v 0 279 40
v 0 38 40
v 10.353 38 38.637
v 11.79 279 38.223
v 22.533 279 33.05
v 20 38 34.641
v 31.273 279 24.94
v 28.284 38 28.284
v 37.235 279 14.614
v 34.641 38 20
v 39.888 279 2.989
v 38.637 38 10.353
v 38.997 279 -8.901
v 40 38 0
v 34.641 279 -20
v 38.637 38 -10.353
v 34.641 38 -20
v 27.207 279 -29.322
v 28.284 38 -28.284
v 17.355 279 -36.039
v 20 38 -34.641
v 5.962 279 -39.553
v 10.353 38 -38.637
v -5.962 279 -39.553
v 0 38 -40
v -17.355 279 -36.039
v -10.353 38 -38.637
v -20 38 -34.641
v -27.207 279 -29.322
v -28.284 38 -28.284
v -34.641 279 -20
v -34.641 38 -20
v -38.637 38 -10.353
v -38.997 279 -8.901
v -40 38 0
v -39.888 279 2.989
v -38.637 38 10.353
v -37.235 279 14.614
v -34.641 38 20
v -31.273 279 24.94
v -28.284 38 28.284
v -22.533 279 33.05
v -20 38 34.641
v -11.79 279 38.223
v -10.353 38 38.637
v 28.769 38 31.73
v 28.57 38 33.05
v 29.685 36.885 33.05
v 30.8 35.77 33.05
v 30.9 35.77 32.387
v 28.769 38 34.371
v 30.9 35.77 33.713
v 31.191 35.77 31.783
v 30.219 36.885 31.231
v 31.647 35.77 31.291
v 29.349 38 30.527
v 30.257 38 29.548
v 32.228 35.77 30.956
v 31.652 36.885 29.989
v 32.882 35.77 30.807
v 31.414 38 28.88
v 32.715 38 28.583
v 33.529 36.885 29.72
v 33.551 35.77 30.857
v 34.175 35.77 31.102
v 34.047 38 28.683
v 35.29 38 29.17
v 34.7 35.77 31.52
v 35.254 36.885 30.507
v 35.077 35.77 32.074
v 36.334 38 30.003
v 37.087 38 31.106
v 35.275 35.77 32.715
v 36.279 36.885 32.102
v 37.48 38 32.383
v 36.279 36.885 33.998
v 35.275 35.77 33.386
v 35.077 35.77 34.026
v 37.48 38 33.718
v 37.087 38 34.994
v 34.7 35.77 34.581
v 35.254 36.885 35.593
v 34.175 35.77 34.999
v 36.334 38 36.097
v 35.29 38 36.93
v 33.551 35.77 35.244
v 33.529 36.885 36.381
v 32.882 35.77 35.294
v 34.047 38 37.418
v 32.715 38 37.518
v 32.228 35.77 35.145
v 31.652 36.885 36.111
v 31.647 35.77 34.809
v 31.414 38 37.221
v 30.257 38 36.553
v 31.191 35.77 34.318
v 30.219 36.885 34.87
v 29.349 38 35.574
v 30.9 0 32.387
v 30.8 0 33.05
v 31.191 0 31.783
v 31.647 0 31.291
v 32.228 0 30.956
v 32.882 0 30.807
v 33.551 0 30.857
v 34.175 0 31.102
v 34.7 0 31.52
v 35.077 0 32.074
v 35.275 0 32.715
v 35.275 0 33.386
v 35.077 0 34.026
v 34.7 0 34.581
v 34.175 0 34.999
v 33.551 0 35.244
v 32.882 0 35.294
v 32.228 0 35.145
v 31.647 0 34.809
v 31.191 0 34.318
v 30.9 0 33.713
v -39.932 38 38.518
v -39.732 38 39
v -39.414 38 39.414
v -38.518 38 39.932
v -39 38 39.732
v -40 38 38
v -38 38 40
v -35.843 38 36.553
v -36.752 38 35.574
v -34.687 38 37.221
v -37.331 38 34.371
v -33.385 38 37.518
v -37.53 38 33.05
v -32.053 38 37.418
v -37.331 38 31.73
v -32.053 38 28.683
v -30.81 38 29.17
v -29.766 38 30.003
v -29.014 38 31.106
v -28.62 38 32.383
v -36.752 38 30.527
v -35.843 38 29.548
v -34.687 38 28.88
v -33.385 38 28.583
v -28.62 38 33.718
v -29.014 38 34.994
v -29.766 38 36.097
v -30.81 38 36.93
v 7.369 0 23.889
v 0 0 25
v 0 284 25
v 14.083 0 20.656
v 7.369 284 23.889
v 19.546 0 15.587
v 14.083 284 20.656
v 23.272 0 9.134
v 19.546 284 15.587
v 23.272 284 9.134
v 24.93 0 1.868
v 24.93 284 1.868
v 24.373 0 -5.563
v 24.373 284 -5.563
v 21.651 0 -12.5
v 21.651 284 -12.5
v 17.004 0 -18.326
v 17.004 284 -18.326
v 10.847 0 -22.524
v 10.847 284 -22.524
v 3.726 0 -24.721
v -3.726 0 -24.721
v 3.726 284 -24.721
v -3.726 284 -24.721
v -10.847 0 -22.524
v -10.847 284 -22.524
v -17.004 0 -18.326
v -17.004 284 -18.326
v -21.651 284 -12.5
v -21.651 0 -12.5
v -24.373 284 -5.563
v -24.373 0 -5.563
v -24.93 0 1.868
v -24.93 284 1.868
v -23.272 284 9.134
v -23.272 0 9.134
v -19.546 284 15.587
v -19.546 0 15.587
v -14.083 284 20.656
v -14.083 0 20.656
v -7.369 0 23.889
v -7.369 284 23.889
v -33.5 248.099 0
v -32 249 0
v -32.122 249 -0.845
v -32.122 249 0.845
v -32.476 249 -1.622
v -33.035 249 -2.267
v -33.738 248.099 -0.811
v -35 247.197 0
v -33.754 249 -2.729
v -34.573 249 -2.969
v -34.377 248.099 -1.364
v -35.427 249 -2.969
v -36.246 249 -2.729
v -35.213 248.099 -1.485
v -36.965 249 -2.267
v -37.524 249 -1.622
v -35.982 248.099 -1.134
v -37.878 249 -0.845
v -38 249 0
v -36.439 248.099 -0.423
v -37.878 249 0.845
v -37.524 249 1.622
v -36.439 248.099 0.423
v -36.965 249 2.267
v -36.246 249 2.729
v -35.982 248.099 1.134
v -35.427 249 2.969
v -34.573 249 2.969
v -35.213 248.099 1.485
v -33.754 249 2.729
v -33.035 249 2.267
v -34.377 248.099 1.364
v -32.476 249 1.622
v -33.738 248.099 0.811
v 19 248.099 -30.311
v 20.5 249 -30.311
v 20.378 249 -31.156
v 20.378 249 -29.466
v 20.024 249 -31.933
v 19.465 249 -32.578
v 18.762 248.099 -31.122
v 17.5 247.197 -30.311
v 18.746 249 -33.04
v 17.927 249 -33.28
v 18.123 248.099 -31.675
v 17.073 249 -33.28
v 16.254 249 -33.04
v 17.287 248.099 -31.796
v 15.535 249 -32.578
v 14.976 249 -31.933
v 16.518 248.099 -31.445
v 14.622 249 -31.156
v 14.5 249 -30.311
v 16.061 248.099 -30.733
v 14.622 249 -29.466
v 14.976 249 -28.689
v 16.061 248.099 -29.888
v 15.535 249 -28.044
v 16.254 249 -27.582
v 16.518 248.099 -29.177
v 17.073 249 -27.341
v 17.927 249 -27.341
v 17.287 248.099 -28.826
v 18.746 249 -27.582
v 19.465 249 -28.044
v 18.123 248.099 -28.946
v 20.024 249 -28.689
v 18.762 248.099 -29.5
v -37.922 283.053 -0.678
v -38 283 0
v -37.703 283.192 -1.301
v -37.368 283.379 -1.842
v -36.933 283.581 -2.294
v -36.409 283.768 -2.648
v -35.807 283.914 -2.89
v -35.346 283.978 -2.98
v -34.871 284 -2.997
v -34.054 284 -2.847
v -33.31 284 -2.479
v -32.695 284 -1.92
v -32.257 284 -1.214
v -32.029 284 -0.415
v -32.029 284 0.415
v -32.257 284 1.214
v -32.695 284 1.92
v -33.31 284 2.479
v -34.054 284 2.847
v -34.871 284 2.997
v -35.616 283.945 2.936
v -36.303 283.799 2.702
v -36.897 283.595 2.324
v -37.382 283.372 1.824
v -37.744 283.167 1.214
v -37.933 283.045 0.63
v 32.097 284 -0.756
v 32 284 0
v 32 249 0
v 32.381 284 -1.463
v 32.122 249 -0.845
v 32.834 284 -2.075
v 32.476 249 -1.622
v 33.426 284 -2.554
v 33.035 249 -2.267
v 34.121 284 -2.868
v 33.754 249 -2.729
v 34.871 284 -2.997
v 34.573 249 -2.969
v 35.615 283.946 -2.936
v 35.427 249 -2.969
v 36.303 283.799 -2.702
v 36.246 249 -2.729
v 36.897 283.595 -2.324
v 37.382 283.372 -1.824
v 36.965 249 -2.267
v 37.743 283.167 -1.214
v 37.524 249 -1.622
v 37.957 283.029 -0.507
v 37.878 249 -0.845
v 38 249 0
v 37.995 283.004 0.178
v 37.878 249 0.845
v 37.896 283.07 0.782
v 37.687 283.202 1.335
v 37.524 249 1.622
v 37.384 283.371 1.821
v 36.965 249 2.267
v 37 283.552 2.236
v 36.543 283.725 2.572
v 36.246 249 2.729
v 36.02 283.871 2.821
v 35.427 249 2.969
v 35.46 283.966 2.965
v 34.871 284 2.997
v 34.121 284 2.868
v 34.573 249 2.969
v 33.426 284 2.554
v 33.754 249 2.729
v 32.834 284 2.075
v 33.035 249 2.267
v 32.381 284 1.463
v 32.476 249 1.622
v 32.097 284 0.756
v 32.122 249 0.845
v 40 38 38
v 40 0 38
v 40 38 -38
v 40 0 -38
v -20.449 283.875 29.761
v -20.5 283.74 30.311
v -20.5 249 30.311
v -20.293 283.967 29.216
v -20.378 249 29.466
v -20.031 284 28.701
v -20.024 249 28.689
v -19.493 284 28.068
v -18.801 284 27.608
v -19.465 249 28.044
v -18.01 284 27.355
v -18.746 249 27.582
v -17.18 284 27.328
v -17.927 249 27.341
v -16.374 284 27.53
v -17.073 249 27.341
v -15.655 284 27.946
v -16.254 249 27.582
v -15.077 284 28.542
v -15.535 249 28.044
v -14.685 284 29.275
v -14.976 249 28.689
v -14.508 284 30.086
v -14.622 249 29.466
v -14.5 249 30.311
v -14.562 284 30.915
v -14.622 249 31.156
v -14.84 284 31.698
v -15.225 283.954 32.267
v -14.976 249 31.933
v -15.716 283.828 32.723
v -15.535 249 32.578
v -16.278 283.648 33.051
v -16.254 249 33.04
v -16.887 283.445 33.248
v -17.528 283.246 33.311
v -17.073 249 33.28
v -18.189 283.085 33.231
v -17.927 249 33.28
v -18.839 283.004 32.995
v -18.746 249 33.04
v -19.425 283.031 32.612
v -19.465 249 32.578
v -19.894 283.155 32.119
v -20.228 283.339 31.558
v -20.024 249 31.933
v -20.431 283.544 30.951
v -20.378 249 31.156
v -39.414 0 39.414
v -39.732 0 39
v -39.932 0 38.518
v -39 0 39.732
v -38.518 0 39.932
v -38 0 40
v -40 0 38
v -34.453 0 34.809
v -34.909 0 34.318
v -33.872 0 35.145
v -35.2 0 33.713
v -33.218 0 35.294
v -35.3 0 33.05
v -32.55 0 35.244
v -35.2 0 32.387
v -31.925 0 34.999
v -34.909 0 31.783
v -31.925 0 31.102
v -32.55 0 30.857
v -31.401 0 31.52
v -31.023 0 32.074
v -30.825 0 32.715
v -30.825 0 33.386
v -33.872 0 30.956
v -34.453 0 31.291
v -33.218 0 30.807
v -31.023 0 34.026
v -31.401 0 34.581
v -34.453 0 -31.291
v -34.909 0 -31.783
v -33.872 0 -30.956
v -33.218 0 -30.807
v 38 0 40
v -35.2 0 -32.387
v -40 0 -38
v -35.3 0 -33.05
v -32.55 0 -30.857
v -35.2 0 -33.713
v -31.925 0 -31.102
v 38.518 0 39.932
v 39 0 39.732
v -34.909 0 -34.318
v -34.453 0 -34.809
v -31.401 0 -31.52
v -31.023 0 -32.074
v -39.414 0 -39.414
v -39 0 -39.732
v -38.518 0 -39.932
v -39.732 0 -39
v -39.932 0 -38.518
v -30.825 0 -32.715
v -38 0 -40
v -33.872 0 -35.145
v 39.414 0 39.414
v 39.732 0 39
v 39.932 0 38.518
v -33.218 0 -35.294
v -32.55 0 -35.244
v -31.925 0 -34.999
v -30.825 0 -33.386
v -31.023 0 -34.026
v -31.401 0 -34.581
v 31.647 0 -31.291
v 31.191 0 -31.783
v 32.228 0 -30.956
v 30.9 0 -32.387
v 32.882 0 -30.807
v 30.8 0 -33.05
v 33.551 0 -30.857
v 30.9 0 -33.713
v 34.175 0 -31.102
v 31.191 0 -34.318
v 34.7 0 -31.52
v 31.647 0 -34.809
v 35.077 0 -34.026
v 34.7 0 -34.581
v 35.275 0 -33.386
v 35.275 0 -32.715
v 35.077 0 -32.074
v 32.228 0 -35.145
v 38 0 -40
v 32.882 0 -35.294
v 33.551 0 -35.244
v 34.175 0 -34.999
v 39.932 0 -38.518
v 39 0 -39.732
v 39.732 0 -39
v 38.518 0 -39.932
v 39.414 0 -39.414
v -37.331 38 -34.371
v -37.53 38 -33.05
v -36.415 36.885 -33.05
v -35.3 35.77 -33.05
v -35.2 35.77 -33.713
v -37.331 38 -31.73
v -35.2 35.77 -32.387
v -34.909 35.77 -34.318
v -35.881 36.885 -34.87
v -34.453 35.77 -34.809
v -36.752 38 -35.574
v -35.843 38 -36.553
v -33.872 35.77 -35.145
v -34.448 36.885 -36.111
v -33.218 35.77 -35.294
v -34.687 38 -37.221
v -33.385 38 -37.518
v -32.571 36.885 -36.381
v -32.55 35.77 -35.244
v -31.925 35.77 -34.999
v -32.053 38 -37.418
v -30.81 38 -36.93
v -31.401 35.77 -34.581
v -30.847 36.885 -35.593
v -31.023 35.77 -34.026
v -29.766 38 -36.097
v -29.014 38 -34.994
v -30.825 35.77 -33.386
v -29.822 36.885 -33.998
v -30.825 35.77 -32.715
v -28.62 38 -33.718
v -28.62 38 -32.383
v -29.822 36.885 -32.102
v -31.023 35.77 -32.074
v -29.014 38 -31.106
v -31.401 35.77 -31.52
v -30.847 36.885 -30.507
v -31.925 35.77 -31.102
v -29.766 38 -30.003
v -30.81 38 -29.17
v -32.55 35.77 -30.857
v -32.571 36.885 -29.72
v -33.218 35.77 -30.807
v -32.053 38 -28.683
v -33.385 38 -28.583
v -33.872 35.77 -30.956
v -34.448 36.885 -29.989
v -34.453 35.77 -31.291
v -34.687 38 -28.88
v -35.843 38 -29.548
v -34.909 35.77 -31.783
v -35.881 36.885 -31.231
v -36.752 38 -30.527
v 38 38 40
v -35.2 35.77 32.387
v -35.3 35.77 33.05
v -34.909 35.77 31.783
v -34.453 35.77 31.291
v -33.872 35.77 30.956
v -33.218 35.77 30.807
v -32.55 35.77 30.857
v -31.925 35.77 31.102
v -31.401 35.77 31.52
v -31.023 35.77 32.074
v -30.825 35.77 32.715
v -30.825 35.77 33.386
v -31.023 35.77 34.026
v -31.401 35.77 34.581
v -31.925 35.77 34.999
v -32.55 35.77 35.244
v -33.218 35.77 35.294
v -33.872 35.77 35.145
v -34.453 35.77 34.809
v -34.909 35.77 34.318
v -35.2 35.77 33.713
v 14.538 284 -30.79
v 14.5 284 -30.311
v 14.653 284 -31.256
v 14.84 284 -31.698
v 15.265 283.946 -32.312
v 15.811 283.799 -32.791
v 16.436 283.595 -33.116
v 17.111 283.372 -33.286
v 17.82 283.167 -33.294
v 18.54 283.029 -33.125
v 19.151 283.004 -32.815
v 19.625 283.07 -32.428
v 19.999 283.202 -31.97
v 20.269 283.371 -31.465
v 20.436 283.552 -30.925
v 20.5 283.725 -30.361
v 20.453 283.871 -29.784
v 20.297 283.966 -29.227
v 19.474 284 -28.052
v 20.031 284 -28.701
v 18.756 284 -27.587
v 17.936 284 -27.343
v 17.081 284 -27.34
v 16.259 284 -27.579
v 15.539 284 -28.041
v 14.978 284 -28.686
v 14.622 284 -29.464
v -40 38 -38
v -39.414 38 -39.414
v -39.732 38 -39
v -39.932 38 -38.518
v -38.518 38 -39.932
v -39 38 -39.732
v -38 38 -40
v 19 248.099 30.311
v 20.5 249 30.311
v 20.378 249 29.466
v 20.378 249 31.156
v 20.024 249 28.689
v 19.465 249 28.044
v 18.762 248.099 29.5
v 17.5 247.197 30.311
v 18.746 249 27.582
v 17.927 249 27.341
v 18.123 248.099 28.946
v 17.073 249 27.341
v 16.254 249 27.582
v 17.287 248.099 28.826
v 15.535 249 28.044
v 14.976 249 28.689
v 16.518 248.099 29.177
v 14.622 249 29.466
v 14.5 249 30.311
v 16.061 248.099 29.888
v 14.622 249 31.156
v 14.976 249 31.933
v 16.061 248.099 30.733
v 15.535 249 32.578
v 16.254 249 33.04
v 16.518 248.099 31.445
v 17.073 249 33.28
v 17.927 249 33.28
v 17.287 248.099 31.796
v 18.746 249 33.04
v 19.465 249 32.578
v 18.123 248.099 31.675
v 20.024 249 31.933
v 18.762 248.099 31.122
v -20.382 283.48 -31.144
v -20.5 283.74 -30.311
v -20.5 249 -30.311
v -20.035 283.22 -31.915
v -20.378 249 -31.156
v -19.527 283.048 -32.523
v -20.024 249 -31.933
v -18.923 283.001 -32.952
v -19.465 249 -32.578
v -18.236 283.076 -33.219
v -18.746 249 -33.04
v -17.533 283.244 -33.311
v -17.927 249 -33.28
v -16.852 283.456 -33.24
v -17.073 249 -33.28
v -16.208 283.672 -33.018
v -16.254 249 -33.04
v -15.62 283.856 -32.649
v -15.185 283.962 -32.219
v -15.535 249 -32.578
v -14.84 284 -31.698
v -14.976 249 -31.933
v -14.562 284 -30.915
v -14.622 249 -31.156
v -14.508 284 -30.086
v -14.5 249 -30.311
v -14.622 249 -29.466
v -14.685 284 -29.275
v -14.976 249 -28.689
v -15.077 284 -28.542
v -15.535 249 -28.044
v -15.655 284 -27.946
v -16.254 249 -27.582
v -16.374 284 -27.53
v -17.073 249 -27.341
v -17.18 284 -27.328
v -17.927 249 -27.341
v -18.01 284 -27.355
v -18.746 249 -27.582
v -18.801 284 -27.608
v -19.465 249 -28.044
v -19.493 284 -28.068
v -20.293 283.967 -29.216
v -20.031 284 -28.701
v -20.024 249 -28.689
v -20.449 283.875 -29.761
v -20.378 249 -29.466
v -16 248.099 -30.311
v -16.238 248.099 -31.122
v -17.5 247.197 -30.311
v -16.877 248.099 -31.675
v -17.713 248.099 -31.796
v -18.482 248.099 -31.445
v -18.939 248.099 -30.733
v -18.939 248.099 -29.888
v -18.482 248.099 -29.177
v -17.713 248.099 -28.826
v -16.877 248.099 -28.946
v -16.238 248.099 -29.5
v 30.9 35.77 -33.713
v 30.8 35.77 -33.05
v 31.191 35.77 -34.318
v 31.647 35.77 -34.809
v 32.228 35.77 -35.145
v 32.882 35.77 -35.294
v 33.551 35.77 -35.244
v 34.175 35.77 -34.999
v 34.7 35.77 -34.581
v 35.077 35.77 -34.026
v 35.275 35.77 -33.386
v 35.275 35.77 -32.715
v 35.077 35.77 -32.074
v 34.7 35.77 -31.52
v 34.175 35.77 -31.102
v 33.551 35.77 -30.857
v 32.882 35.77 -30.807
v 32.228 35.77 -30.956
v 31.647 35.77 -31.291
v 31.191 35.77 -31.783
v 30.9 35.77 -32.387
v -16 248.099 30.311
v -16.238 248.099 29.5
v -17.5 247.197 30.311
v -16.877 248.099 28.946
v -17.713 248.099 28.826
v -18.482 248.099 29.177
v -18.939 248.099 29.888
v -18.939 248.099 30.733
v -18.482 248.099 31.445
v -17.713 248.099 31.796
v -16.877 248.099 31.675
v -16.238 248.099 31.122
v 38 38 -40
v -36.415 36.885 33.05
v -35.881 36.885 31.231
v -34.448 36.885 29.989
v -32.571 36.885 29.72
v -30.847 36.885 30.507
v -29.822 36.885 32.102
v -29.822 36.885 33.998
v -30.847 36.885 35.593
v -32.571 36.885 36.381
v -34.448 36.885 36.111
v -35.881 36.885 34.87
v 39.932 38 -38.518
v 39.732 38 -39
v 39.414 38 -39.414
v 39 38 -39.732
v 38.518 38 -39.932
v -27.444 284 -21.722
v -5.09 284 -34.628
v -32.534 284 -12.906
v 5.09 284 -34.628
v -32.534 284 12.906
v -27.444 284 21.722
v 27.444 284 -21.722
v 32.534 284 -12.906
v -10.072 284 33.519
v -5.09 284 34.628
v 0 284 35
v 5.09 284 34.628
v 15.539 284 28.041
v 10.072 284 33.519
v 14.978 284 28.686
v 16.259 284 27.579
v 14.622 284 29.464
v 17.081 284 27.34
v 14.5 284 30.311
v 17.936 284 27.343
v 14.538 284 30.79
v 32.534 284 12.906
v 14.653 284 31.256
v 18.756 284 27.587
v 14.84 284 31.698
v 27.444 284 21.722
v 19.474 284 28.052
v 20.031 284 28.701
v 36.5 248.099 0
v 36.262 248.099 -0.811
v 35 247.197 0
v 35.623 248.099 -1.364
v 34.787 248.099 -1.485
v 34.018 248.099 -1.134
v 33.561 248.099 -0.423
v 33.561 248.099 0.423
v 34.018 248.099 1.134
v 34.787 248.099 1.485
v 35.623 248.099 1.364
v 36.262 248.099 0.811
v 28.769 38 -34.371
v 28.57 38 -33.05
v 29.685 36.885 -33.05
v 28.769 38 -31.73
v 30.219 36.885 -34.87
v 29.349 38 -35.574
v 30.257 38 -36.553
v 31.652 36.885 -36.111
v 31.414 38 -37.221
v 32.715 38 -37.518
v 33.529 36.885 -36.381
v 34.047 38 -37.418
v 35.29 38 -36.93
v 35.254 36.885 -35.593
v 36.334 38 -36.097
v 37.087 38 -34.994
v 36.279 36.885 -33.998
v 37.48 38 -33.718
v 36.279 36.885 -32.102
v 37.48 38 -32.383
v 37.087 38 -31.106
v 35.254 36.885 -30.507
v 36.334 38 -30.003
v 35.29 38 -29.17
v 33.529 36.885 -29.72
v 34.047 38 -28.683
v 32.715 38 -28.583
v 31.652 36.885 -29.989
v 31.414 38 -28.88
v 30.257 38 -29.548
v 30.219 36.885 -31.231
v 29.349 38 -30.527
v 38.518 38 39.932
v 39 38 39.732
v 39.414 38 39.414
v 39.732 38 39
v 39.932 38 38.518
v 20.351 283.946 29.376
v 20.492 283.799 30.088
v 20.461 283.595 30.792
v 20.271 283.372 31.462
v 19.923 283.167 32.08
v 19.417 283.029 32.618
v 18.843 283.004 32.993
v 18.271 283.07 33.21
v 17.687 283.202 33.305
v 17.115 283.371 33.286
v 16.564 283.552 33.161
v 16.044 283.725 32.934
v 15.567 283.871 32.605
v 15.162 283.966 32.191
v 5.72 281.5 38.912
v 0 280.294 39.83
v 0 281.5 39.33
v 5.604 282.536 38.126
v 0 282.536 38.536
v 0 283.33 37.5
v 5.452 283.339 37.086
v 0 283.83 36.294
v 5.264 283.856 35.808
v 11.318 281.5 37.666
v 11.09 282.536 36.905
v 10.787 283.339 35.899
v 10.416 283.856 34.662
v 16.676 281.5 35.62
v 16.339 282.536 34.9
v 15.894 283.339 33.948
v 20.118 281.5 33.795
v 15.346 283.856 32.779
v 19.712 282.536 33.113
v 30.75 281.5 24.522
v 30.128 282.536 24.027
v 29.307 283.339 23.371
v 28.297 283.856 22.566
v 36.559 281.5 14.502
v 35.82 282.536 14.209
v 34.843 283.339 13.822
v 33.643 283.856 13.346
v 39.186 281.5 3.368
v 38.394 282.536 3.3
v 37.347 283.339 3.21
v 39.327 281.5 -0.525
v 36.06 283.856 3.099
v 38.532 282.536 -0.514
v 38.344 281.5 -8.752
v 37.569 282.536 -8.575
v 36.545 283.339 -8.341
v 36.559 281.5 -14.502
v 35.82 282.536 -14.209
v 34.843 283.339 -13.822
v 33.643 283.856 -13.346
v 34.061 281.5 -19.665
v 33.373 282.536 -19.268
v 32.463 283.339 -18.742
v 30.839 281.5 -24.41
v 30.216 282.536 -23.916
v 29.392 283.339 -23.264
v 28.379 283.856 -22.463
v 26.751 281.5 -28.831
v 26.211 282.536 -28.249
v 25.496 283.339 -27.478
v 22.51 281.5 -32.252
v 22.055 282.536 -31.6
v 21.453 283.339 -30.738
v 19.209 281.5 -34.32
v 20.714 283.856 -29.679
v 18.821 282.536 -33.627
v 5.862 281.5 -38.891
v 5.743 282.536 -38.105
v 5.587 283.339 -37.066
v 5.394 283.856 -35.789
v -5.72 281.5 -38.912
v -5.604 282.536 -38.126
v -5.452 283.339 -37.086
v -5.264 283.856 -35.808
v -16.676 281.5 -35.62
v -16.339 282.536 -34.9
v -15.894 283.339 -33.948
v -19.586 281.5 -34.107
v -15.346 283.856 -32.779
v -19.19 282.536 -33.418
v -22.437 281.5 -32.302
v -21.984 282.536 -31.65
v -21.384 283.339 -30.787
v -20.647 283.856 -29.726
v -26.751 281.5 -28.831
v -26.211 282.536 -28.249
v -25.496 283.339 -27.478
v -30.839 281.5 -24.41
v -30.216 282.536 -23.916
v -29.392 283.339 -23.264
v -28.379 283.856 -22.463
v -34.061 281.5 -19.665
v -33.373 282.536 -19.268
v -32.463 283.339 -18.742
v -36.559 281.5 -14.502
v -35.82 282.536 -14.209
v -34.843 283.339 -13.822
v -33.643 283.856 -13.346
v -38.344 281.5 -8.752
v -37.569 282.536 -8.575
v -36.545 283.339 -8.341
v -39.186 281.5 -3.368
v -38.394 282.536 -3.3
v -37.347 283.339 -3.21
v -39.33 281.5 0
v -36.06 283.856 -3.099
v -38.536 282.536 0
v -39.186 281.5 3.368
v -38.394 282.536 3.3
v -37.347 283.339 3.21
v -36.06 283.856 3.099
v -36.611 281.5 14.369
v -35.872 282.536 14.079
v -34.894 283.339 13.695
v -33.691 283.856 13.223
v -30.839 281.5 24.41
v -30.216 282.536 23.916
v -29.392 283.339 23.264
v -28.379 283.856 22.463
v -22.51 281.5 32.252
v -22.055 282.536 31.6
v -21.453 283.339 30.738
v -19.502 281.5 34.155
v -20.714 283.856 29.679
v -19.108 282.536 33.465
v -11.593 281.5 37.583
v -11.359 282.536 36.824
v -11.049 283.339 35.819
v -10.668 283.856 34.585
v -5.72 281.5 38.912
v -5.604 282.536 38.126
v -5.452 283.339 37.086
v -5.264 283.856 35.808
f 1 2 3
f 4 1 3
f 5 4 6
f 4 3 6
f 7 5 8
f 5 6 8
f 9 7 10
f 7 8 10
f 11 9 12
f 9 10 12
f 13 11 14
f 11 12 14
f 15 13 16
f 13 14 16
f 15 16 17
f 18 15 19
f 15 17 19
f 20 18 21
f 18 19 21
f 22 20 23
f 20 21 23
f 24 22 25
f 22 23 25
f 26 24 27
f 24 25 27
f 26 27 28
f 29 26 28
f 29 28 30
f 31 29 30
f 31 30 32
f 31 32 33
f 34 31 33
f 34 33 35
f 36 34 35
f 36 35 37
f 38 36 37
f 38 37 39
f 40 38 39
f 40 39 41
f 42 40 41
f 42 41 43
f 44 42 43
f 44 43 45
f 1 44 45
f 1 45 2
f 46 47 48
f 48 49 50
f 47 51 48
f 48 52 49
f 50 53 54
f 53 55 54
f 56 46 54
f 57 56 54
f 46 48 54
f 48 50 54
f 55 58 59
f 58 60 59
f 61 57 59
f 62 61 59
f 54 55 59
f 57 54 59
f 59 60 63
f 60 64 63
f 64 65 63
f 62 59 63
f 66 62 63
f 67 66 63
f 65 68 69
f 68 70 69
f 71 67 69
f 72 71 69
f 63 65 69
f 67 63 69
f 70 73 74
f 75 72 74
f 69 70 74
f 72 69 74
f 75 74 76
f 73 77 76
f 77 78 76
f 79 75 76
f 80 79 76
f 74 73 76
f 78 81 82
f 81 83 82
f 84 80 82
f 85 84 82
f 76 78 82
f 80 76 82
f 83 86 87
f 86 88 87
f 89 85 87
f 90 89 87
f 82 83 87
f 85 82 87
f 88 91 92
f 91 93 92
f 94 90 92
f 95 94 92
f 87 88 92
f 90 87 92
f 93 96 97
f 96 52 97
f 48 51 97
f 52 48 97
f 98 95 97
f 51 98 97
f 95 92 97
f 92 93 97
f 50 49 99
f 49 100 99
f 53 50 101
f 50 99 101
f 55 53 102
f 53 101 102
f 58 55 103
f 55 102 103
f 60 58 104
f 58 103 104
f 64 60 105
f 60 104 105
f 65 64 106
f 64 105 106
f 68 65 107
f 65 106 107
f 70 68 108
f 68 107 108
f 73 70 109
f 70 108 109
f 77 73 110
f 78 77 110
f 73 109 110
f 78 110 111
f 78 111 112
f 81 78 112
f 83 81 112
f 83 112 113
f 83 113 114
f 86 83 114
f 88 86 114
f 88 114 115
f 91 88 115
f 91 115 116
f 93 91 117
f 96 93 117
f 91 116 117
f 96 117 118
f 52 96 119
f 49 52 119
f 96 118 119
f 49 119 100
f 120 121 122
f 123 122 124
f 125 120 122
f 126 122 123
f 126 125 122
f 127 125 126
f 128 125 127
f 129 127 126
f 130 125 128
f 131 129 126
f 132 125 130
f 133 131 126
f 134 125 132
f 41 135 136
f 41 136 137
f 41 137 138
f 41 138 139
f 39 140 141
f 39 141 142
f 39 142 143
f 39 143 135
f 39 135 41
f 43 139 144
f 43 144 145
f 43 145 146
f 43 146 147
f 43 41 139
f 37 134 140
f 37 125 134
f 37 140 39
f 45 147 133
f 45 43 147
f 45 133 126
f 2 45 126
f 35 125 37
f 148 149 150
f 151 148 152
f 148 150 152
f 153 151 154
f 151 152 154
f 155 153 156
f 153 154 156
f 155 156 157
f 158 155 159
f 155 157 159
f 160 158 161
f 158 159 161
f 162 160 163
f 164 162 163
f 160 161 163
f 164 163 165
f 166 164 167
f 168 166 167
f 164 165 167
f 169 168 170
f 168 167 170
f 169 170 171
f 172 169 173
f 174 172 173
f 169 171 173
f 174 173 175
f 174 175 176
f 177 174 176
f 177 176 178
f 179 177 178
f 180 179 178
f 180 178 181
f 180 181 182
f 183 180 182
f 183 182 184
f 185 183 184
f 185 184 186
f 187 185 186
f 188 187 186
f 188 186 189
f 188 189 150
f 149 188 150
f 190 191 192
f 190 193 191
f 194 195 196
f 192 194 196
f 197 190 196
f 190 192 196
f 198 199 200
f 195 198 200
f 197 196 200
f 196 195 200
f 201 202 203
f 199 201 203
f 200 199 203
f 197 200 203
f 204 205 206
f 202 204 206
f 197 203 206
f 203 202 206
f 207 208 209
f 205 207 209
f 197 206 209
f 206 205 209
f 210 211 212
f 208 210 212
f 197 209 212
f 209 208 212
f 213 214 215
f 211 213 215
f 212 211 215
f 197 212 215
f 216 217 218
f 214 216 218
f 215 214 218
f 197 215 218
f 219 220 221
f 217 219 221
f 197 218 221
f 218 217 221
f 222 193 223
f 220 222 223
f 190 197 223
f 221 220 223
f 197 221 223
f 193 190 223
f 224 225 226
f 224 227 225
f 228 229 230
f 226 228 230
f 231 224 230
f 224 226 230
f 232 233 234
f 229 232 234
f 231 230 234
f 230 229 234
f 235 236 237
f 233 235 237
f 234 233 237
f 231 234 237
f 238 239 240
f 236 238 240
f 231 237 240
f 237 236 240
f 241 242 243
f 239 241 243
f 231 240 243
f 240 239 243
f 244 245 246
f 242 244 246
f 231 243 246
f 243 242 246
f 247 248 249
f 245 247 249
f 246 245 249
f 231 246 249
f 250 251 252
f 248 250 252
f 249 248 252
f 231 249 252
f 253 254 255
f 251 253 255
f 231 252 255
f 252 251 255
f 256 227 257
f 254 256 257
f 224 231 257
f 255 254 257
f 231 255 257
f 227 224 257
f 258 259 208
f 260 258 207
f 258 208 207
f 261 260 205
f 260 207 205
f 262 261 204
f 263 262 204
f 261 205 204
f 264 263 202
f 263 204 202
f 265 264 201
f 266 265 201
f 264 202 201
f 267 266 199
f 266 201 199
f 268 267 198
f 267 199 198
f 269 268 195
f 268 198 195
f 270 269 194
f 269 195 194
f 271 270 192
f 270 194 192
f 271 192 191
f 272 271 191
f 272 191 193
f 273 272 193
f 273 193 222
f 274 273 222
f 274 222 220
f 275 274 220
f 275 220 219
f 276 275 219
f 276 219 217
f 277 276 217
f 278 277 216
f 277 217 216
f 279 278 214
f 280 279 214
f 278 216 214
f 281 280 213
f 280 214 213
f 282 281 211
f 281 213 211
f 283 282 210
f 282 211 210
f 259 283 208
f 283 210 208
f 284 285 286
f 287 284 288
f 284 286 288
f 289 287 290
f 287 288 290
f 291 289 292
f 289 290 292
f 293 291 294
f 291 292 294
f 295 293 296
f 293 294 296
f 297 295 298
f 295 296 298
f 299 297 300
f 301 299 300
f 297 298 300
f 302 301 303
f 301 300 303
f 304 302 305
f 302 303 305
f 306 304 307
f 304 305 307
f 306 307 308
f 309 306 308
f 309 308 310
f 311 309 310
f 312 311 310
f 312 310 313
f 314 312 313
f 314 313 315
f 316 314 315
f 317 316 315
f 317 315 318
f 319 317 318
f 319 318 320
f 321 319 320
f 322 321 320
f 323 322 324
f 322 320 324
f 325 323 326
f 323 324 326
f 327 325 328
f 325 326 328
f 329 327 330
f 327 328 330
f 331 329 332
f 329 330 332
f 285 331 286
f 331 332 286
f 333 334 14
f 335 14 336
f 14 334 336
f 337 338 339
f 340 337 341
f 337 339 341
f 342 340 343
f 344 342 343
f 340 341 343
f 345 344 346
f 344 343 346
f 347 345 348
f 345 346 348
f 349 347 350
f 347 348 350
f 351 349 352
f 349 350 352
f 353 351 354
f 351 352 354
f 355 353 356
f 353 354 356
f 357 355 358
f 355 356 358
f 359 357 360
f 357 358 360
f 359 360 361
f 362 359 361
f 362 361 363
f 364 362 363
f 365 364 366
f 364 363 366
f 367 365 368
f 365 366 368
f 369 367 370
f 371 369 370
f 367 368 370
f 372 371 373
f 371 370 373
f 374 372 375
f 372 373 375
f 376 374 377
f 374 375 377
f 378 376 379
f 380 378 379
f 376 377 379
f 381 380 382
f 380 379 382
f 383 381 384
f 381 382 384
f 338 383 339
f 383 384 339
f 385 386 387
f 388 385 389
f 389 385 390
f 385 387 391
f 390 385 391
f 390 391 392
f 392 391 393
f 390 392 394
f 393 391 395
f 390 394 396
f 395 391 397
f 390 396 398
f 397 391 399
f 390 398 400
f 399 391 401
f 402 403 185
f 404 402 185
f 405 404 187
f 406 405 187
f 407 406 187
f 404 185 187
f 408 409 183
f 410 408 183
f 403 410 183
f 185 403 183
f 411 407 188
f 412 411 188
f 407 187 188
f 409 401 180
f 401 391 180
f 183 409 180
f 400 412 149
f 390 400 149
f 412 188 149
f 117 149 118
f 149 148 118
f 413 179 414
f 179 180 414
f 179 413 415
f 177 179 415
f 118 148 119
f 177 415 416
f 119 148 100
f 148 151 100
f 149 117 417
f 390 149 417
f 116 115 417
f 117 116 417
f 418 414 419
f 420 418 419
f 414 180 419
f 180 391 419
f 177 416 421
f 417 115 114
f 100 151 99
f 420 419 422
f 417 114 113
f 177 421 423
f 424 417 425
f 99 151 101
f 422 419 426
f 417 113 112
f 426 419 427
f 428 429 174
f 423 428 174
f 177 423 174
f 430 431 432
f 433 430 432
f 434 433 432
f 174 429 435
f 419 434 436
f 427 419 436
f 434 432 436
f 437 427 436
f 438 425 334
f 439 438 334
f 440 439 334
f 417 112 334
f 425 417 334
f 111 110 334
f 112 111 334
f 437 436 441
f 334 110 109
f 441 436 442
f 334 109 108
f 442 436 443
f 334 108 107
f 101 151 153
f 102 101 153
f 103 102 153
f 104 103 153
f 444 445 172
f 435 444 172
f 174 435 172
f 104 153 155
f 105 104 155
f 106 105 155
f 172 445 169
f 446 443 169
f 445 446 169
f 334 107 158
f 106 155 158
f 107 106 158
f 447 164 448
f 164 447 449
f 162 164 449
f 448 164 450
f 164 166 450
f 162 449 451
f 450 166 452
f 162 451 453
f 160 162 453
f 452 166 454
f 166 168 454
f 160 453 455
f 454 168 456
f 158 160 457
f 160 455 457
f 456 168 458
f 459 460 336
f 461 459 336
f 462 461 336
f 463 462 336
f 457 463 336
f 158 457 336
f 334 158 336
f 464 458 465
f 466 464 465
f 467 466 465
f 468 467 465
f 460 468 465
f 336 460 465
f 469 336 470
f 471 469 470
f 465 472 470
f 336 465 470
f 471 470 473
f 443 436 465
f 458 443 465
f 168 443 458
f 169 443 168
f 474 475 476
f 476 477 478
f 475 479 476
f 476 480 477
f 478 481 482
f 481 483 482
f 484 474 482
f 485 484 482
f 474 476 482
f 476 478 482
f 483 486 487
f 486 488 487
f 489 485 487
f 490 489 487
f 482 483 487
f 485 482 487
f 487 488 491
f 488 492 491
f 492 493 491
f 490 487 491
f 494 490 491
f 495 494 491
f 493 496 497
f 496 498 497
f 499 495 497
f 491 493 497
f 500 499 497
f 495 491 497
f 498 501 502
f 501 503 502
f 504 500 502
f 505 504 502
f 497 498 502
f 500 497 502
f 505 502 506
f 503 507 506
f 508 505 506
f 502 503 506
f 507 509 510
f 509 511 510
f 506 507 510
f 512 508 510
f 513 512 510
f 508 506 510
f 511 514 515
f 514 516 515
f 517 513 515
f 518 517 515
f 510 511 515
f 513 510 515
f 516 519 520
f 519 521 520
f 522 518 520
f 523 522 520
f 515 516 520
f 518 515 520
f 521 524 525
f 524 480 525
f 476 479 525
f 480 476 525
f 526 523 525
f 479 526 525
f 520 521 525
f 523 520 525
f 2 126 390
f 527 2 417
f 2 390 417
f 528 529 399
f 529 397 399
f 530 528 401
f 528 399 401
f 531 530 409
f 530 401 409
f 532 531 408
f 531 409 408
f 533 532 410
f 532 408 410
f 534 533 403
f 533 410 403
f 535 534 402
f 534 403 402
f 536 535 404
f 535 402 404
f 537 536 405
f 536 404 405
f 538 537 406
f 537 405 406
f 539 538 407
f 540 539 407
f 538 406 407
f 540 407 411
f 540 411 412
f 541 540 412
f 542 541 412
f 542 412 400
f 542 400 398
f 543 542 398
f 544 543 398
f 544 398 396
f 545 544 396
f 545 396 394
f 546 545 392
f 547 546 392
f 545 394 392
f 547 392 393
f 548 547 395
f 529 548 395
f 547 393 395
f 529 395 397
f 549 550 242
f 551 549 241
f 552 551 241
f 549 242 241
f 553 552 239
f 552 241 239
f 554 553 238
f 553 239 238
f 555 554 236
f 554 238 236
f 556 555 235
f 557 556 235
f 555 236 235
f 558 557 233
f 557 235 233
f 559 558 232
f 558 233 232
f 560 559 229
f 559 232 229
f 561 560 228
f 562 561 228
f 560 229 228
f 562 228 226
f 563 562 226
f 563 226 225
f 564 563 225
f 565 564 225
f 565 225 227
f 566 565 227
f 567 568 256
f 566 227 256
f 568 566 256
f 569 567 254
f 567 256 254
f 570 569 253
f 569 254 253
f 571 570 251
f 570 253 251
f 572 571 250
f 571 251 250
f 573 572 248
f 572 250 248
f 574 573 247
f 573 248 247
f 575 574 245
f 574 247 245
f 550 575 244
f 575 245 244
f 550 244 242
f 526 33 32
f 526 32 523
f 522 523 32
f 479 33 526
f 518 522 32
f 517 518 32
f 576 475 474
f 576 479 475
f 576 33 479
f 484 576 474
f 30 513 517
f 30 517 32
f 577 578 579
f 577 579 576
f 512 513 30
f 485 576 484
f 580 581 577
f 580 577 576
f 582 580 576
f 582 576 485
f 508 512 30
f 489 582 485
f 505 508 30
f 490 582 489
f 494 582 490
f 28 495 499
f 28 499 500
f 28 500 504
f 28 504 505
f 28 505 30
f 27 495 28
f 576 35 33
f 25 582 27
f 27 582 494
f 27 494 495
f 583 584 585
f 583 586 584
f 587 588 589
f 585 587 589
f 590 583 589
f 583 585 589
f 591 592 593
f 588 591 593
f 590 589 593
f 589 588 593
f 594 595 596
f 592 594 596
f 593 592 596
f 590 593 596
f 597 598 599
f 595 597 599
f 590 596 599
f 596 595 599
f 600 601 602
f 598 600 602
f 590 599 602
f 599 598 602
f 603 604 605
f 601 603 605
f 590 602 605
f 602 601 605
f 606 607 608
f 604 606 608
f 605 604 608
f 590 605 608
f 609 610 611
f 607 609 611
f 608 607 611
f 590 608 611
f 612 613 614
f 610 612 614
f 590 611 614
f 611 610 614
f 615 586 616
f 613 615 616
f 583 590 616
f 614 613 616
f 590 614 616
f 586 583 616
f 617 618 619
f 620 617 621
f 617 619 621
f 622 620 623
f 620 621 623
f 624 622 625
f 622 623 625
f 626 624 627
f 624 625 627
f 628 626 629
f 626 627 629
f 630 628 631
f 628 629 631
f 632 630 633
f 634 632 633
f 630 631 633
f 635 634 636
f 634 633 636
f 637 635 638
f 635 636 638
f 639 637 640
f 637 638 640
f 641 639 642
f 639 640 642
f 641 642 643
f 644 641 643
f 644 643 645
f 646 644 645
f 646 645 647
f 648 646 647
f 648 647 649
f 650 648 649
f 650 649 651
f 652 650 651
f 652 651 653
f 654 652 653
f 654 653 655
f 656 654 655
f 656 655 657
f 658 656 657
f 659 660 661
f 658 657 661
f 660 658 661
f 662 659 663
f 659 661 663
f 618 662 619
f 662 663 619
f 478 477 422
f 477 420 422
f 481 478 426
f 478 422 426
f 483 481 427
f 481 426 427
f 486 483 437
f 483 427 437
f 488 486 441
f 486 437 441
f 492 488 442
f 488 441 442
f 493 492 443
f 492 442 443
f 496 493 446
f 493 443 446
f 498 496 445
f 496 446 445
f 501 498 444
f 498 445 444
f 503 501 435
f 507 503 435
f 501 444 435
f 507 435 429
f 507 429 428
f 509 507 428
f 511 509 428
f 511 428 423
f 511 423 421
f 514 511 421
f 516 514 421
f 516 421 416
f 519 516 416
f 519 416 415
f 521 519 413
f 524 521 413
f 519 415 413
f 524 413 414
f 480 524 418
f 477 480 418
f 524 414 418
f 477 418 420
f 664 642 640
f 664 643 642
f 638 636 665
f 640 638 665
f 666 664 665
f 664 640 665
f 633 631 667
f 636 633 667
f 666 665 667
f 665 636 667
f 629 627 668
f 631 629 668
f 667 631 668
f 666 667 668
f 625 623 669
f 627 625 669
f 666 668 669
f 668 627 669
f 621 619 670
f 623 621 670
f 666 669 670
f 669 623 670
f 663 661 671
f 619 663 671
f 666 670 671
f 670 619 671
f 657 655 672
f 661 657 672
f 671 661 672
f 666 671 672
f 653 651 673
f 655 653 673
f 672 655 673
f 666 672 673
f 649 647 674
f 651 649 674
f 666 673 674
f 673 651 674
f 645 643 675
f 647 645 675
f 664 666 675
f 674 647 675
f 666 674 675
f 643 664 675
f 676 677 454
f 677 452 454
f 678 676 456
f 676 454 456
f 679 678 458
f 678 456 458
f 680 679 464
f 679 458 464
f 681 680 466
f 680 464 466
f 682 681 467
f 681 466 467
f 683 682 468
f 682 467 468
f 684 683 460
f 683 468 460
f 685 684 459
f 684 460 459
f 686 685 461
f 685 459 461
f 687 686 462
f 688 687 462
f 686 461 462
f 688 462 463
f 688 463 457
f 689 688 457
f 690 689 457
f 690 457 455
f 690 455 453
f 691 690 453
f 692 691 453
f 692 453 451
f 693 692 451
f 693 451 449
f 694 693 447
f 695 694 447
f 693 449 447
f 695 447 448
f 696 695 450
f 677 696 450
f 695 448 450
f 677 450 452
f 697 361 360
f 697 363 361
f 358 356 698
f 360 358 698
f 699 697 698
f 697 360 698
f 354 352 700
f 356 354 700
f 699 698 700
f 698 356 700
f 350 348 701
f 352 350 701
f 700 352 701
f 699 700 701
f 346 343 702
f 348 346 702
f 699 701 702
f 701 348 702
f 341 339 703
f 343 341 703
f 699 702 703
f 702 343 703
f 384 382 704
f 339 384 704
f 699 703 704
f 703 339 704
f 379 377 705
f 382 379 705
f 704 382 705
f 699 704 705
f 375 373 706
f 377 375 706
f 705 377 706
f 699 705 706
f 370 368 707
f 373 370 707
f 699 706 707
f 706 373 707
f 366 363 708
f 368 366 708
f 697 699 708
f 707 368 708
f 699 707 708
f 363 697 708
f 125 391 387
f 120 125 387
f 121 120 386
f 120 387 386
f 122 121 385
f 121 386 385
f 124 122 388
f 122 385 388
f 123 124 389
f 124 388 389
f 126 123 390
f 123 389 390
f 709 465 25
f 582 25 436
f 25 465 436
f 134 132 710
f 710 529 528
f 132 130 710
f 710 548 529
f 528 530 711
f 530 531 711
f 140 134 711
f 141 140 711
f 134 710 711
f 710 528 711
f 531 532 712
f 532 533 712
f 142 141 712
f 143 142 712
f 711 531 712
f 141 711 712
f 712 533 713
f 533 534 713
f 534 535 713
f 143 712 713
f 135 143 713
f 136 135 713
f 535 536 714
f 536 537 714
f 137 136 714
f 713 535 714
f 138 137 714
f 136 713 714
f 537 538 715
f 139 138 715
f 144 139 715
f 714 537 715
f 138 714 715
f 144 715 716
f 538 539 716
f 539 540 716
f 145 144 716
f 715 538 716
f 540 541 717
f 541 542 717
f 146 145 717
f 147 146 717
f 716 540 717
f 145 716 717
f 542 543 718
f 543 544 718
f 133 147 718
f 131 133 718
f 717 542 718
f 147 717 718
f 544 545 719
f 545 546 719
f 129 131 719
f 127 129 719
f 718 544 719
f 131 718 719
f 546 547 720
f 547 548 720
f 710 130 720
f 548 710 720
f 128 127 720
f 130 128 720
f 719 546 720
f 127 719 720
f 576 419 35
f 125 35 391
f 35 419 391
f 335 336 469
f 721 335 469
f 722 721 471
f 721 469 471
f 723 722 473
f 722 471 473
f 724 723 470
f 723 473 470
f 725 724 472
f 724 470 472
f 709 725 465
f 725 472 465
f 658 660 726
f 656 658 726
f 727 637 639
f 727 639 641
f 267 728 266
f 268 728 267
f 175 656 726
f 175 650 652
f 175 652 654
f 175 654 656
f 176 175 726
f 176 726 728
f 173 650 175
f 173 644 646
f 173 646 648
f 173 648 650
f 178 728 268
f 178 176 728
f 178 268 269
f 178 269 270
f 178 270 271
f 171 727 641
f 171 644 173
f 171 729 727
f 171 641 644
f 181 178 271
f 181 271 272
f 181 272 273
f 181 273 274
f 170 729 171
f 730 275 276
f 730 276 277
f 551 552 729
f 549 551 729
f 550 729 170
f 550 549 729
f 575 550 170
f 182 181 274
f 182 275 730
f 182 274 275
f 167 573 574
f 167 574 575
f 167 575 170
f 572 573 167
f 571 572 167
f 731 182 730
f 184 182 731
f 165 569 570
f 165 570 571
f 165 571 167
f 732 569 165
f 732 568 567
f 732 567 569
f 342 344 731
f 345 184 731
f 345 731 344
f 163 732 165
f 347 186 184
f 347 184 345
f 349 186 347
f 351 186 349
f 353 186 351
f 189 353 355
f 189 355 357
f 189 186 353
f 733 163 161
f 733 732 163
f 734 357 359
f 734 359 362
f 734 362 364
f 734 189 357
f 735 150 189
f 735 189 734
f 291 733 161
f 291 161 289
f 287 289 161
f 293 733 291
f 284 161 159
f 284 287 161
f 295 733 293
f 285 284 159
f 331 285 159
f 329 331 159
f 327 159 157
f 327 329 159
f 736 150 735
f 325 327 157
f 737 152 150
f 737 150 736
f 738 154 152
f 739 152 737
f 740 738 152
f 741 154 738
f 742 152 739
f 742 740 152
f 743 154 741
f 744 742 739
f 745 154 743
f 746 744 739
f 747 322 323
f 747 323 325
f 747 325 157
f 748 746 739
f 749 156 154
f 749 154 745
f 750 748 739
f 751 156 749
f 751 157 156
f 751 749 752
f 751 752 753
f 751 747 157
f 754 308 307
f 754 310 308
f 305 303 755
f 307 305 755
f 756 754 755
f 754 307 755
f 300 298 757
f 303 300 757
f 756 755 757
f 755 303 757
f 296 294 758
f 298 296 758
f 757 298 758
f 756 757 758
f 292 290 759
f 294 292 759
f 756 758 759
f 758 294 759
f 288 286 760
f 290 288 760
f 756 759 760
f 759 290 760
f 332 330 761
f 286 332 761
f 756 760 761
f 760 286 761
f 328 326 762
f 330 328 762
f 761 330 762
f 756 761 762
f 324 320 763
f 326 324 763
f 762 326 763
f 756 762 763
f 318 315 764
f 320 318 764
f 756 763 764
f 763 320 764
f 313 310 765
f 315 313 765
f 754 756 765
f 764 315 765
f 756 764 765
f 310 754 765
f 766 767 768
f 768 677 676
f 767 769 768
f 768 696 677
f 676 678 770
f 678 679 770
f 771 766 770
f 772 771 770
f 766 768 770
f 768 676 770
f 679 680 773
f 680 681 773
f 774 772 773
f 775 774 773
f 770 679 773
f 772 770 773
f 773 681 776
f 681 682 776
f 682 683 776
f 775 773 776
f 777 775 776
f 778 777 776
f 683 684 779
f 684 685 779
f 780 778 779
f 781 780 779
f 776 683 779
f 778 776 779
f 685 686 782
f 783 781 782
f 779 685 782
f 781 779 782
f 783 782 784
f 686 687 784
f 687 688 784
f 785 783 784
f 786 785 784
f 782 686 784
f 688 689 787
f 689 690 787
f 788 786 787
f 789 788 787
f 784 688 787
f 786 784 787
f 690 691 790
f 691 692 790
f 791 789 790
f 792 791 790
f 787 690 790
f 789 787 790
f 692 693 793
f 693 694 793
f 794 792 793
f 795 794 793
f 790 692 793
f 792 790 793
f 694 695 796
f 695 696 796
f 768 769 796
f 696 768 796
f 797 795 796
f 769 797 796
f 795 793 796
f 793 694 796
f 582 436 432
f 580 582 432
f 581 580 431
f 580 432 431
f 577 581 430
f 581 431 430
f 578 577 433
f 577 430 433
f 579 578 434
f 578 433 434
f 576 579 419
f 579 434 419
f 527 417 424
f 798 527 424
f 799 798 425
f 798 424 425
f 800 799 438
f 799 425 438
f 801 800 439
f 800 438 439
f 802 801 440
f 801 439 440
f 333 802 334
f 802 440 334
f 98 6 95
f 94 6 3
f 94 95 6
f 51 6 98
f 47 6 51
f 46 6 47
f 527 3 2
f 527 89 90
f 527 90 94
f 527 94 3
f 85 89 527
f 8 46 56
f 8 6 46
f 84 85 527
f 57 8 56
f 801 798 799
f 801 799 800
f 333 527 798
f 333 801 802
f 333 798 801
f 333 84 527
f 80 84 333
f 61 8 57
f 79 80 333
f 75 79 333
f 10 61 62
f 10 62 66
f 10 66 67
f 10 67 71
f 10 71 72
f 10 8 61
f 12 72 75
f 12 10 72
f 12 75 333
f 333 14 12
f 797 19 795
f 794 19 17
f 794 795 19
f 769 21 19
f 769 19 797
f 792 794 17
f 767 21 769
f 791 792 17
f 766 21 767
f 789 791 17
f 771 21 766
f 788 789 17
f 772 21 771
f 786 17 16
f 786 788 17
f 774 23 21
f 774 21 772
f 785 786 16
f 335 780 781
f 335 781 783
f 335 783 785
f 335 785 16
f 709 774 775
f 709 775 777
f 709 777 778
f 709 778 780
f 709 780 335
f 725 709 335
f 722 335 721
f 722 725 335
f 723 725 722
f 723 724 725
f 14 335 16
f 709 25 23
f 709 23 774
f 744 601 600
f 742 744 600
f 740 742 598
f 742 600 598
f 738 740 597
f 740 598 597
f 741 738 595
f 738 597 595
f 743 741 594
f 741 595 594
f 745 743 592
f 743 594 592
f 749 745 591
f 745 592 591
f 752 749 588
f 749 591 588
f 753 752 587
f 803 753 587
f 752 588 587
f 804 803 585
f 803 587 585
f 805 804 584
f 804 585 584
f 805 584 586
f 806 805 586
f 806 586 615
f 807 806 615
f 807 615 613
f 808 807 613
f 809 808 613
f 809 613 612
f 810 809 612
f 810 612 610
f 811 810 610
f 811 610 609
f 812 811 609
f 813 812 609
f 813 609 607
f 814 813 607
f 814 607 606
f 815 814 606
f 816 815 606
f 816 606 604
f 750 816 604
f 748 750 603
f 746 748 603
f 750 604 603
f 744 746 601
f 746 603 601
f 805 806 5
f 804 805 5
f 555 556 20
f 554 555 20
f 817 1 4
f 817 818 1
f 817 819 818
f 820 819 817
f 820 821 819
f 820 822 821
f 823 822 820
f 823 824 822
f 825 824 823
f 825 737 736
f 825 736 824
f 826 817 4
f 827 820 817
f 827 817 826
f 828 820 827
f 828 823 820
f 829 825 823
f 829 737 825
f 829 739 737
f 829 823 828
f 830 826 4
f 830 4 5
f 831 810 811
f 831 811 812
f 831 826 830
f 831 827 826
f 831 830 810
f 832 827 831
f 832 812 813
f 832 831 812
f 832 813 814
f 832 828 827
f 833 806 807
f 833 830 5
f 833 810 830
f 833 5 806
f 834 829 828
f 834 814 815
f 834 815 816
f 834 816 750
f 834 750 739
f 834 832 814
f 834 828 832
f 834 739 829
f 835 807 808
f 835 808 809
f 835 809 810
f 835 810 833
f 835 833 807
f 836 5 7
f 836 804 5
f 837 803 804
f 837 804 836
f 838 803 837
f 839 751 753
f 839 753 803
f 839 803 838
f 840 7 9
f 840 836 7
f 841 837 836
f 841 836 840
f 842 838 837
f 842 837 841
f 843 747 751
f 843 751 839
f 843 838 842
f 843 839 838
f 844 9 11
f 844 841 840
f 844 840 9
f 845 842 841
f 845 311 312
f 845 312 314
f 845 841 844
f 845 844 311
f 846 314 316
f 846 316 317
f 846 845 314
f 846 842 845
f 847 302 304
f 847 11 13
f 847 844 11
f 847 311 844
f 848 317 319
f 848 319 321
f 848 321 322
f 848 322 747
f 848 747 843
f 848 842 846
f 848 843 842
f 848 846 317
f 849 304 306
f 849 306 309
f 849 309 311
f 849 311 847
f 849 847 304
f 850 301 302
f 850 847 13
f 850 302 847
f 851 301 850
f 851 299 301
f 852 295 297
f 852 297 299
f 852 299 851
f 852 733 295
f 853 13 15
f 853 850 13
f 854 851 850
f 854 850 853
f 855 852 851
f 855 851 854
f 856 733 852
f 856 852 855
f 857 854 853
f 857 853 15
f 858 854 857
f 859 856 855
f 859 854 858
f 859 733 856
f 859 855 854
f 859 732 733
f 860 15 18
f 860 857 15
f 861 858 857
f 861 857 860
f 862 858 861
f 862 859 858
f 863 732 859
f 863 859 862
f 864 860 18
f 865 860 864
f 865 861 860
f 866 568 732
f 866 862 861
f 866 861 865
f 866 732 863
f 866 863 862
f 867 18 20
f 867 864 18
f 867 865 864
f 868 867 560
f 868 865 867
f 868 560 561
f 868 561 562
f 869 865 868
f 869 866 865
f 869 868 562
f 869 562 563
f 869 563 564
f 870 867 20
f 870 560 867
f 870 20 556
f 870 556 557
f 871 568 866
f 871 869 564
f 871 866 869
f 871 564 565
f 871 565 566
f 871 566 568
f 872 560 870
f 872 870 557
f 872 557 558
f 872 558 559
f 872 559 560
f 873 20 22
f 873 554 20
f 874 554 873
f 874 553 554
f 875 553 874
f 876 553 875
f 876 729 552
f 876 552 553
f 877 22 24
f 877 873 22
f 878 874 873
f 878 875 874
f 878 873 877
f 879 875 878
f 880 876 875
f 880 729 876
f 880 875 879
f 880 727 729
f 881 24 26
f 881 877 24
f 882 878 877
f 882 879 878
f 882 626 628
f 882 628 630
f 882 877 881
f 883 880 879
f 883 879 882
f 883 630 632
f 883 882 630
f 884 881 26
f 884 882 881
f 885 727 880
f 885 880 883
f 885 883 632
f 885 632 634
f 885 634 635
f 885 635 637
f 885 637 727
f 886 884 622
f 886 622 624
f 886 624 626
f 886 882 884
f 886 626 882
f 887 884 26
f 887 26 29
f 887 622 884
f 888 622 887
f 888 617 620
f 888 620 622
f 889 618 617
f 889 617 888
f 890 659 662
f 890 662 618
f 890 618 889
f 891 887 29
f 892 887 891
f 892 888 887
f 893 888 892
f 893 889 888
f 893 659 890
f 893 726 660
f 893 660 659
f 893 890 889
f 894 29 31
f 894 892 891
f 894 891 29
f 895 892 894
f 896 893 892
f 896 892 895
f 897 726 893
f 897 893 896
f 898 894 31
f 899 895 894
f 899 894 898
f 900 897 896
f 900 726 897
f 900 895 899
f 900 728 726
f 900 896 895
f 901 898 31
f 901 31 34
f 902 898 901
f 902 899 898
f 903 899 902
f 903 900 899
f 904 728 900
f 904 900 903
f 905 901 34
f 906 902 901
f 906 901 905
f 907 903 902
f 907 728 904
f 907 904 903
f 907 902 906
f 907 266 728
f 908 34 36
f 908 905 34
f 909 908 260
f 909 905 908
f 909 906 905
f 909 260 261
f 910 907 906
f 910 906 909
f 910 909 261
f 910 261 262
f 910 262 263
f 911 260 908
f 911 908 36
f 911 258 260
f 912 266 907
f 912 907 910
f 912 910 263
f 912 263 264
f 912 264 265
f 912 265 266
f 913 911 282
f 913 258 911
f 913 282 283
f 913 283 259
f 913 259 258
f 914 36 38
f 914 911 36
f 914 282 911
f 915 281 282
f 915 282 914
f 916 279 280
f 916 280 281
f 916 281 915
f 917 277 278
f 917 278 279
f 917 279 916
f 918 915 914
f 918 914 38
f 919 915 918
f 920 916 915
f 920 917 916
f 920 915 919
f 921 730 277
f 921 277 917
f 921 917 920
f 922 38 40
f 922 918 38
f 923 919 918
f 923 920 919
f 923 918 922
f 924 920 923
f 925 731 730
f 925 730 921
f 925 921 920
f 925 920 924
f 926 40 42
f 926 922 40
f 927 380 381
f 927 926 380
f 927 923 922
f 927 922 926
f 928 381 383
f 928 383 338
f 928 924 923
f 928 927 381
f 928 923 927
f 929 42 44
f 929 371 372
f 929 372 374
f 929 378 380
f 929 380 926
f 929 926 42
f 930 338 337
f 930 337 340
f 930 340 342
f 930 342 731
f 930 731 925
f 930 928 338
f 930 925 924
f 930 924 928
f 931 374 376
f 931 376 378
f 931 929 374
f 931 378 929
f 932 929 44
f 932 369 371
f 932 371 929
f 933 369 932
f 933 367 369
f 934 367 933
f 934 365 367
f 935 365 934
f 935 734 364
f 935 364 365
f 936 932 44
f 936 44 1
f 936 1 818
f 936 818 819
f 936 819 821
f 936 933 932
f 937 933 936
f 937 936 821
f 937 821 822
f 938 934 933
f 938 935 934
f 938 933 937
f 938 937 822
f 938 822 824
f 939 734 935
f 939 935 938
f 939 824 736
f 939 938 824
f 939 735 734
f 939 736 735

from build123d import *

# Parameters (mm, degrees)
DODANIE_WYCI_GNI_CIE1_DEPTH                        = 38
SZKIC2_R                                           = 40
DODANIE_WYCI_GNI_CIE2_DEPTH                        = 246
POG_BIENIE_STO_KOWE_POD_M4_WKR_T_Z_BEM_D           = 4.5
POG_BIENIE_STO_KOWE_POD_M4_WKR_T_Z_BEM_CSINK_D     = 8.96
POG_BIENIE_STO_KOWE_POD_M4_WKR_T_Z_BEM_CSINK_ANGLE = 90
SZKIC6_R                                           = 25
WYTNIJ_WYCI_GNI_CIE1_DEPTH                         = 290.579004764
ZAOKR_GLENIE1_R                                    = 5
OTWORY_USTALAJ_CE_6_0MM1_D                         = 6
OTWORY_USTALAJ_CE_6_0MM1_DEPTH                     = 35
OTWORY_USTALAJ_CE_6_0MM1_TIP                       = 1.802581857


with BuildPart() as part:
    # Szkic1 → Dodanie-wyciągnięcie1 (new body)
    with BuildSketch(Plane(origin=(0, 0, 0), x_dir=(1, 0, 0), z_dir=(0, 1, 0))):
        with BuildLine():
            Line((-38, -40), (38, -40))
            ThreePointArc((38, -40), (39.414213562, -39.414213562), (40, -38))
            Line((40, -38), (40, 38))
            ThreePointArc((40, 38), (39.414213562, 39.414213562), (38, 40))
            Line((38, 40), (-38, 40))
            ThreePointArc((-38, 40), (-39.414213562, 39.414213562), (-40, 38))
            Line((-40, 38), (-40, -38))
            ThreePointArc((-40, -38), (-39.414213562, -39.414213562), (-38, -40))
        make_face()
    extrude(amount=DODANIE_WYCI_GNI_CIE1_DEPTH)

    # Szkic2 → Dodanie-wyciągnięcie2 (add)
    with BuildSketch(Plane(origin=(0, 38, 0), x_dir=(1, 0, 0), z_dir=(0, 1, 0))):
        with Locations(Location((0, 0, 0), (0, 0, 270))):
            Circle(SZKIC2_R)
    extrude(amount=DODANIE_WYCI_GNI_CIE2_DEPTH)

    # Pogłębienie stożkowe pod M4 Wkręt z łbem stożkowym płaskim1 (through all)
    with Locations(Plane(origin=(0, 38, 0), x_dir=(1, 0, 0), z_dir=(0, 1, 0))):
        with Locations((-33.050252532, 33.050252532), (33.050252532, 33.050252532), (33.050252532, -33.050252532), (-33.050252532, -33.050252532)):
            CounterSinkHole(POG_BIENIE_STO_KOWE_POD_M4_WKR_T_Z_BEM_D / 2, POG_BIENIE_STO_KOWE_POD_M4_WKR_T_Z_BEM_CSINK_D / 2, counter_sink_angle=POG_BIENIE_STO_KOWE_POD_M4_WKR_T_Z_BEM_CSINK_ANGLE)

    # Szkic6 → Wytnij-wyciągnięcie1 (cut, through all)
    with BuildSketch(Plane(origin=(0, 284, 0), x_dir=(1, 0, 0), z_dir=(0, 1, 0))):
        with Locations(Location((0, 0, 0), (0, 0, 270))):
            Circle(SZKIC6_R)
    extrude(amount=-WYTNIJ_WYCI_GNI_CIE1_DEPTH, mode=Mode.SUBTRACT)

    # Zaokrąglenie1
    zaokr_glenie1_edges = [part.edges().sort_by_distance(p)[0] for p in [
        (0, 284, -40),
    ]]
    fillet(zaokr_glenie1_edges, radius=ZAOKR_GLENIE1_R)

    # Otwory ustalające Ø6.0mm1
    with Locations(Plane(origin=(0, 284, 0), x_dir=(1, 0, 0), z_dir=(0, 1, 0))):
        with Locations((-17.5, 30.310889132), (17.5, 30.310889132), (35, 0), (17.5, -30.310889132), (-17.5, -30.310889132), (-35, 0)):
            Hole(OTWORY_USTALAJ_CE_6_0MM1_D / 2, depth=OTWORY_USTALAJ_CE_6_0MM1_DEPTH)
            with Locations((0, 0, -(OTWORY_USTALAJ_CE_6_0MM1_DEPTH + OTWORY_USTALAJ_CE_6_0MM1_TIP / 2))):  # 118° drill point
                Cone(0, OTWORY_USTALAJ_CE_6_0MM1_D / 2, OTWORY_USTALAJ_CE_6_0MM1_TIP, mode=Mode.SUBTRACT)


solid = part.part
